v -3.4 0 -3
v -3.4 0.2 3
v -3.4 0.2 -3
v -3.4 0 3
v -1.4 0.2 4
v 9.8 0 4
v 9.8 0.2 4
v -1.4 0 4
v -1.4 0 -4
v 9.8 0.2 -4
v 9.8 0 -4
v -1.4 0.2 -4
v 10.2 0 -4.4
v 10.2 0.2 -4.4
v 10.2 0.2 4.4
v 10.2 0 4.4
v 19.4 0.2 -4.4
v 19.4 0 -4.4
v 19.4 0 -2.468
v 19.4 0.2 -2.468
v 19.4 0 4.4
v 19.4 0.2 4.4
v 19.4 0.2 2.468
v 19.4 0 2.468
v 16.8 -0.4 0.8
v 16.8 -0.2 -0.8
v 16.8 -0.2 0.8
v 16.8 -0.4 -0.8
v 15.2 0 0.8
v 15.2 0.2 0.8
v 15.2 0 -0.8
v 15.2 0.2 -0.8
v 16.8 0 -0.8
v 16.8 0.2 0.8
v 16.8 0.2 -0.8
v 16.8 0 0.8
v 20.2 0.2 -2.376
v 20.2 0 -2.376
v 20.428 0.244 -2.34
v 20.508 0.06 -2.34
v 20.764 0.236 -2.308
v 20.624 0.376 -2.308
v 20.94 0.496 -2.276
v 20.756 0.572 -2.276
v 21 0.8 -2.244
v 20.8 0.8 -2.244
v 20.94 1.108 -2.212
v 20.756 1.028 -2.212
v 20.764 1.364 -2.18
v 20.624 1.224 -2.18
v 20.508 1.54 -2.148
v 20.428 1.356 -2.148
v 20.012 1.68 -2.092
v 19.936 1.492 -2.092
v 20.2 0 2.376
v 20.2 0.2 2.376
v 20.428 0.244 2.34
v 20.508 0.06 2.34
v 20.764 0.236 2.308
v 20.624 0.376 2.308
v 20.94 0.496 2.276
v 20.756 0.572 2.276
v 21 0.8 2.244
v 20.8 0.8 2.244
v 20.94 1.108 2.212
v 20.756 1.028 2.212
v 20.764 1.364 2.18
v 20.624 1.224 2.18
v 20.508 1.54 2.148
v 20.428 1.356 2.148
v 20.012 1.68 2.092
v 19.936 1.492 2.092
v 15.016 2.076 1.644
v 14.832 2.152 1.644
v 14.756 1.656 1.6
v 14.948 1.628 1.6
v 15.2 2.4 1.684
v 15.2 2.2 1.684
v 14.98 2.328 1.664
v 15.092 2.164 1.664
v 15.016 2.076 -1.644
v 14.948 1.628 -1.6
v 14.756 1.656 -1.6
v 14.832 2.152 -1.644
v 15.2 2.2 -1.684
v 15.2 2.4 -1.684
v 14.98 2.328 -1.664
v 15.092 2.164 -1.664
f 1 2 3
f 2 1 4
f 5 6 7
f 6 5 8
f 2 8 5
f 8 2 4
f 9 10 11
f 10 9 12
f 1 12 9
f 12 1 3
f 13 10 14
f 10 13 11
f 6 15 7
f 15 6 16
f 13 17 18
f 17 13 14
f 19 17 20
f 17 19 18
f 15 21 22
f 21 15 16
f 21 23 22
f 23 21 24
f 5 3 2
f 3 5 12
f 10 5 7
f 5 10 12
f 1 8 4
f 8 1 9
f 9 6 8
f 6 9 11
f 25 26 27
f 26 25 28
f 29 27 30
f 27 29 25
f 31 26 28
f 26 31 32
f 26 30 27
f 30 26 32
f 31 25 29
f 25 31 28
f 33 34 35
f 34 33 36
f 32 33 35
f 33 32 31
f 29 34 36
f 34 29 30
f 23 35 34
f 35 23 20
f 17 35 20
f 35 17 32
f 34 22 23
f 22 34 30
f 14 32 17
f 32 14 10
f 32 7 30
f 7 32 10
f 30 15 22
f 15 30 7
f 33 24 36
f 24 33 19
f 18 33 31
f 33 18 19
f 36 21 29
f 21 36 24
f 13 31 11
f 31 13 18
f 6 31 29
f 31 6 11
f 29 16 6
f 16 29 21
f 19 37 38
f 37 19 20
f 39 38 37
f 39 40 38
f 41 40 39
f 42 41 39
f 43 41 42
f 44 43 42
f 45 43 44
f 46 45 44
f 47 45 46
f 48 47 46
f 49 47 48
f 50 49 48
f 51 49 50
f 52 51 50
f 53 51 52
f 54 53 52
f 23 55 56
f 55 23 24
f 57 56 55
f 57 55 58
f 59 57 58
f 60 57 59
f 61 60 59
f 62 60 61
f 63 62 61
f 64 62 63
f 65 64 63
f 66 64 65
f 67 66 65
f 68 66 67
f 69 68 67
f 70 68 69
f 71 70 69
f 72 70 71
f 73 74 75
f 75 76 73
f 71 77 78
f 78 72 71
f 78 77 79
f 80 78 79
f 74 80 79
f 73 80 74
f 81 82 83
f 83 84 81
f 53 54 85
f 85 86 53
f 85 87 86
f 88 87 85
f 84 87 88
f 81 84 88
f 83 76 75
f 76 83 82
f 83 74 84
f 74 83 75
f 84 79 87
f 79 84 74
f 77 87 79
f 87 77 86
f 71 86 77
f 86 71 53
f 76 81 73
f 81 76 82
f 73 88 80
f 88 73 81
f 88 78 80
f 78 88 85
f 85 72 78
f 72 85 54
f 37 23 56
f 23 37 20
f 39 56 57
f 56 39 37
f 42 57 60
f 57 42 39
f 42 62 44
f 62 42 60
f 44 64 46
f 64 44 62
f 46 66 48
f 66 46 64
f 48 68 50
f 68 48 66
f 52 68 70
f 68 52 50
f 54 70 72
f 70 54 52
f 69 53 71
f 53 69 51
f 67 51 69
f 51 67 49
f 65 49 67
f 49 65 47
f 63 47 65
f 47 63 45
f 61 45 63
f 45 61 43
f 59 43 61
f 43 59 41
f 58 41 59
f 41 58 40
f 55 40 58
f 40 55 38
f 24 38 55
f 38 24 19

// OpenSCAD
// file: ../p/rect2p.scad
use <../lib.scad>
function ldraw_lib__rect2p() = [
// 0 Rectangle with 2 Parallel Edges
// 0 Name: rect2p.dat
// 0 Author: Donald Sutter [technog]
// 0 !LDRAW_ORG Primitive UPDATE 2010-01
// 0 !LICENSE Licensed under CC BY 4.0 : see CAreadme.txt
// 
// 0 BFC CERTIFY CCW
  [0,"BFC","CERTIFY"],
  [0,"BFC","CCW"],
// 
// 0 !HISTORY 2003-08-01 [PTadmin] Official Update 2003-02
// 0 !HISTORY 2007-06-24 [PTadmin] Header formatted for Contributor Agreement
// 0 !HISTORY 2008-07-01 [PTadmin] Official Update 2008-01
// 0 !HISTORY 2010-01-17 [mikeheide] changed winding to CCW
// 0 !HISTORY 2010-04-05 [PTadmin] Official Update 2010-01
// 
// 
// 2 24 1 0 1 -1 0 1
  [2,24,1,0,1,-1,0,1],
// 2 24 -1 0 -1 1 0 -1
  [2,24,-1,0,-1,1,0,-1],
// 4 16 -1 0 1 -1 0 -1 1 0 -1 1 0 1
  [4,16,-1,0,1,-1,0,-1,1,0,-1,1,0,1],
// 0
];
module ldraw_lib__rect2p(step=0, col=false, unit=2/5, alt=false, line=0.2, solid=!$preview)
    makepoly(ldraw_lib__rect2p(), step=step, col=col, unit=unit, alt=alt, line=line, solid=solid);
ldraw_lib__rect2p(line=0.2);
// file: ../p/box5-2p.scad
use <../lib.scad>
function ldraw_lib__box5_2p() = [
// 0 Box with  5 Faces without  2 Parallel Edges
// 0 Name: box5-2p.dat
// 0 Author: Willy Tschager [Holly-Wood]
// 0 !LDRAW_ORG Primitive UPDATE 2024-01
// 0 !LICENSE Licensed under CC BY 4.0 : see CAreadme.txt
// 
// 0 BFC CERTIFY CCW
  [0,"BFC","CERTIFY"],
  [0,"BFC","CCW"],
// 
// 0 !HISTORY 2012-03-30 [PTadmin] Official Update 2012-01
// 0 !HISTORY 2024-01-04 [Holly-Wood] Complete re-write, original by Brickaneer
// 0 !HISTORY 2024-01-29 [OrionP] Official Update 2024-01
// 
// 2 24 -1 1 1 1 1 1
  [2,24,-1,1,1,1,1,1],
// 2 24 -1 1 -1 -1 1 1
  [2,24,-1,1,-1,-1,1,1],
// 2 24 1 1 -1 -1 1 -1
  [2,24,1,1,-1,-1,1,-1],
// 2 24 1 1 1 1 1 -1
  [2,24,1,1,1,1,1,-1],
// 4 16 1 1 1 1 1 -1 -1 1 -1 -1 1 1
  [4,16,1,1,1,1,1,-1,-1,1,-1,-1,1,1],
// 
// 2 24 -1 1 1 -1 0 1
  [2,24,-1,1,1,-1,0,1],
// 2 24 -1 1 -1 -1 0 -1
  [2,24,-1,1,-1,-1,0,-1],
// 2 24 -1 0 -1 -1 0 1
  [2,24,-1,0,-1,-1,0,1],
// 4 16 -1 1 1 -1 1 -1 -1 0 -1 -1 0 1
  [4,16,-1,1,1,-1,1,-1,-1,0,-1,-1,0,1],
// 
// 2 24 1 1 1 1 0 1
  [2,24,1,1,1,1,0,1],
// 2 24 1 1 -1 1 0 -1
  [2,24,1,1,-1,1,0,-1],
// 2 24 1 0 1 1 0 -1
  [2,24,1,0,1,1,0,-1],
// 4 16 1 1 -1 1 1 1 1 0 1 1 0 -1
  [4,16,1,1,-1,1,1,1,1,0,1,1,0,-1],
// 
// 4 16 1 1 1 -1 1 1 -1 0 1 1 0 1
  [4,16,1,1,1,-1,1,1,-1,0,1,1,0,1],
// 4 16 -1 1 -1 1 1 -1 1 0 -1 -1 0 -1
  [4,16,-1,1,-1,1,1,-1,1,0,-1,-1,0,-1],
];
module ldraw_lib__box5_2p(step=0, col=false, unit=2/5, alt=false, line=0.2, solid=!$preview)
    makepoly(ldraw_lib__box5_2p(), step=step, col=col, unit=unit, alt=alt, line=line, solid=solid);
ldraw_lib__box5_2p(line=0.2);
// file: ../p/box3u4a.scad
use <../lib.scad>
function ldraw_lib__box3u4a() = [
// 0 Box with 3 Faces without 4 Adjacent Edges
// 0 Name: box3u4a.dat
// 0 Author: Niels Karsdorp [nielsk]
// 0 !LDRAW_ORG Primitive UPDATE 2009-01
// 0 !LICENSE Licensed under CC BY 4.0 : see CAreadme.txt
// 
// 0 BFC CERTIFY CCW
  [0,"BFC","CERTIFY"],
  [0,"BFC","CCW"],
// 
// 0 !HISTORY 2009-05-02 [PTadmin] Official Update 2009-01
// 
// 
// 2 24 1 1 1 -1 1 1
  [2,24,1,1,1,-1,1,1],
// 2 24 -1 1 -1 1 1 -1
  [2,24,-1,1,-1,1,1,-1],
// 2 24 1 1 1 1 1 -1
  [2,24,1,1,1,1,1,-1],
// 2 24 -1 1 1 -1 1 -1
  [2,24,-1,1,1,-1,1,-1],
// 2 24 1 1 1 1 0 1
  [2,24,1,1,1,1,0,1],
// 2 24 1 1 -1 1 0 -1
  [2,24,1,1,-1,1,0,-1],
// 2 24 -1 1 1 -1 0 1
  [2,24,-1,1,1,-1,0,1],
// 2 24 -1 1 -1 -1 0 -1
  [2,24,-1,1,-1,-1,0,-1],
// 4 16 -1 1 -1 -1 1 1 1 1 1 1 1 -1
  [4,16,-1,1,-1,-1,1,1,1,1,1,1,1,-1],
// 4 16 -1 1 1 -1 0 1 1 0 1 1 1 1
  [4,16,-1,1,1,-1,0,1,1,0,1,1,1,1],
// 4 16 1 1 -1 1 0 -1 -1 0 -1 -1 1 -1
  [4,16,1,1,-1,1,0,-1,-1,0,-1,-1,1,-1],
// 0
];
module ldraw_lib__box3u4a(step=0, col=false, unit=2/5, alt=false, line=0.2, solid=!$preview)
    makepoly(ldraw_lib__box3u4a(), step=step, col=col, unit=unit, alt=alt, line=line, solid=solid);
ldraw_lib__box3u4a(line=0.2);
// file: ../p/box2-5.scad
use <../lib.scad>
function ldraw_lib__box2_5() = [
// 0 Box with 2 Faces without 5 Edges
// 0 Name: box2-5.dat
// 0 Author: Steffen [Steffen]
// 0 !LDRAW_ORG Primitive UPDATE 2003-03
// 0 !LICENSE Licensed under CC BY 4.0 : see CAreadme.txt
// 
// 0 BFC CERTIFY CCW
  [0,"BFC","CERTIFY"],
  [0,"BFC","CCW"],
// 
// 0 !HISTORY 2003-12-19 [PTadmin] Official Update 2003-03
// 0 !HISTORY 2007-06-24 [PTadmin] Header formatted for Contributor Agreement
// 0 !HISTORY 2008-07-01 [PTadmin] Official Update 2008-01
// 
// 
// 2 24 1 1 1 -1 1 1
  [2,24,1,1,1,-1,1,1],
// 2 24 1 1 -1 -1 1 -1
  [2,24,1,1,-1,-1,1,-1],
// 2 24 1 -1 1 -1 -1 1
  [2,24,1,-1,1,-1,-1,1],
// 2 24 -1 -1 1 -1 1 1
  [2,24,-1,-1,1,-1,1,1],
// 2 24 1 -1 1 1 1 1
  [2,24,1,-1,1,1,1,1],
// 2 24 -1 1 -1 -1 1 1
  [2,24,-1,1,-1,-1,1,1],
// 2 24 1 1 -1 1 1 1
  [2,24,1,1,-1,1,1,1],
// 4 16 1 1 1 1 1 -1 -1 1 -1 -1 1 1
  [4,16,1,1,1,1,1,-1,-1,1,-1,-1,1,1],
// 4 16 1 1 1 -1 1 1 -1 -1 1 1 -1 1
  [4,16,1,1,1,-1,1,1,-1,-1,1,1,-1,1],
// 0
];
module ldraw_lib__box2_5(step=0, col=false, unit=2/5, alt=false, line=0.2, solid=!$preview)
    makepoly(ldraw_lib__box2_5(), step=step, col=col, unit=unit, alt=alt, line=line, solid=solid);
ldraw_lib__box2_5(line=0.2);
// main file
use <../lib.scad>
use <../p/box2-5.scad>
use <../p/box3u4a.scad>
use <../p/box5-2p.scad>
use <../p/rect2p.scad>
use <s/u9641s01.scad>
function ldraw_lib__u9641() = [
// 0 ~Electric 9V Battery Box  4 x 14 x  4 Bottom - Contact Horizontal Long
// 0 Name: u9641.dat
// 0 Author: Gerald Lasser [GeraldLasser]
// 0 !LDRAW_ORG Part UPDATE 2024-08
// 0 !LICENSE Licensed under CC BY 4.0 : see CAreadme.txt
// 
// 0 BFC CERTIFY CCW
  [0,"BFC","CERTIFY"],
  [0,"BFC","CCW"],
// 
// 0 !HISTORY 2024-09-30 [OrionP] Official Update 2024-08
// 
// 1 16 -8.5 0 .25 0 1 0 7.5 0 0 0 0 -.25 rect2p.dat
  [1,16,-8.5,0,.25,0,1,0,7.5,0,0,0,0,-.25, ldraw_lib__rect2p()],
// 1 16 8 -8.75 .25 0 2.5 -14 0 -1.25 0 -.25 0 0 box2-5.dat
  [1,16,8,-8.75,.25,0,2.5,-14,0,-1.25,0,-.25,0,0, ldraw_lib__box2_5()],
// 1 16 8 8.75 .25 0 2.5 -14 0 1.25 0 -.25 0 0 box2-5.dat
  [1,16,8,8.75,.25,0,2.5,-14,0,1.25,0,-.25,0,0, ldraw_lib__box2_5()],
// 1 16 25 10.5 .25 -.5 0 0 -.5 -1 0 0 0 .25 rect2p.dat
  [1,16,25,10.5,.25,-.5,0,0,-.5,-1,0,0,0,.25, ldraw_lib__rect2p()],
// 1 16 25 -10.5 .25 .5 0 0 -.5 1 0 0 0 .25 rect2p.dat
  [1,16,25,-10.5,.25,.5,0,0,-.5,1,0,0,0,.25, ldraw_lib__rect2p()],
// 1 16 37 8.585 .25 0 0 11.5 0 2.415 0 -.25 0 0 box2-5.dat
  [1,16,37,8.585,.25,0,0,11.5,0,2.415,0,-.25,0,0, ldraw_lib__box2_5()],
// 1 16 37 -8.585 .25 0 0 11.5 0 -2.415 0 -.25 0 0 box2-5.dat
  [1,16,37,-8.585,.25,0,0,11.5,0,-2.415,0,-.25,0,0, ldraw_lib__box2_5()],
// 4 16 -8.5 -7.5 .5 -3.5 -10 .5 -3.5 10 .5 -8.5 7.5 .5
  [4,16,-8.5,-7.5,.5,-3.5,-10,.5,-3.5,10,.5,-8.5,7.5,.5],
// 4 16 -3.5 -10 .5 24.5 -10 .5 24.5 10 .5 -3.5 10 .5
  [4,16,-3.5,-10,.5,24.5,-10,.5,24.5,10,.5,-3.5,10,.5],
// 4 16 -3.5 10 0 -3.5 -10 0 -8.5 -7.5 0 -8.5 7.5 0
  [4,16,-3.5,10,0,-3.5,-10,0,-8.5,-7.5,0,-8.5,7.5,0],
// 4 16 24.5 10 0 24.5 -10 0 -3.5 -10 0 -3.5 10 0
  [4,16,24.5,10,0,24.5,-10,0,-3.5,-10,0,-3.5,10,0],
// 
// 1 16 38 0 .25 0 4 0 2 0 0 0 -1 .25 box5-2p.dat
  [1,16,38,0,.25,0,4,0,2,0,0,0,-1,.25, ldraw_lib__box5_2p()],
// 0 BFC INVERTNEXT
  [0,"BFC","INVERTNEXT"],
// 1 16 38 0 .25 0 4 0 0 0 2 -.25 0 0 box3u4a.dat
  [1,16,38,0,.25,0,4,0,0,0,2,-.25,0,0, ldraw_lib__box3u4a()],
// 
// 4 16 42 2 .5 42 -2 .5 48.5 -6.17 .5 48.5 6.17 .5
  [4,16,42,2,.5,42,-2,.5,48.5,-6.17,.5,48.5,6.17,.5],
// 4 16 42 2 .5 48.5 6.17 .5 48.5 11 .5 38 2 .5
  [4,16,42,2,.5,48.5,6.17,.5,48.5,11,.5,38,2,.5],
// 4 16 48.5 -6.17 .5 42 -2 .5 38 -2 .5 48.5 -11 .5
  [4,16,48.5,-6.17,.5,42,-2,.5,38,-2,.5,48.5,-11,.5],
// 4 16 38 2 .5 48.5 11 .5 25.5 11 .5 24.5 10 .5
  [4,16,38,2,.5,48.5,11,.5,25.5,11,.5,24.5,10,.5],
// 4 16 38 2 .5 24.5 10 .5 24.5 -10 .5 38 -2 .5
  [4,16,38,2,.5,24.5,10,.5,24.5,-10,.5,38,-2,.5],
// 4 16 38 -2 .5 24.5 -10 .5 25.5 -11 .5 48.5 -11 .5
  [4,16,38,-2,.5,24.5,-10,.5,25.5,-11,.5,48.5,-11,.5],
// 4 16 48.5 -6.17 0 42 -2 0 42 2 0 48.5 6.17 0
  [4,16,48.5,-6.17,0,42,-2,0,42,2,0,48.5,6.17,0],
// 4 16 48.5 11 0 48.5 6.17 0 42 2 0 38 2 0
  [4,16,48.5,11,0,48.5,6.17,0,42,2,0,38,2,0],
// 4 16 38 -2 0 42 -2 0 48.5 -6.17 0 48.5 -11 0
  [4,16,38,-2,0,42,-2,0,48.5,-6.17,0,48.5,-11,0],
// 4 16 25.5 11 0 48.5 11 0 38 2 0 24.5 10 0
  [4,16,25.5,11,0,48.5,11,0,38,2,0,24.5,10,0],
// 4 16 24.5 -10 0 24.5 10 0 38 2 0 38 -2 0
  [4,16,24.5,-10,0,24.5,10,0,38,2,0,38,-2,0],
// 4 16 25.5 -11 0 24.5 -10 0 38 -2 0 48.5 -11 0
  [4,16,25.5,-11,0,24.5,-10,0,38,-2,0,48.5,-11,0],
// 5 24 38 -2 .5 38 2 .5 24.5 10 .5 42 -2 -.5
  [5,24,38,-2,.5,38,2,.5,24.5,10,.5,42,-2,-.5],
// 5 24 38 -2 0 38 2 0 42 2 -1 24.5 10 0
  [5,24,38,-2,0,38,2,0,42,2,-1,24.5,10,0],
// 
// 1 16 38 -.25 .5 1 0 0 0 1 0 0 0 -1 s\u9641s01.dat
  [1,16,38,-.25,.5,1,0,0,0,1,0,0,0,-1, ldraw_lib__s__u9641s01()],
];
module ldraw_lib__u9641(step=0, col=false, unit=2/5, alt=false, line=0.2, solid=!$preview)
    makepoly(ldraw_lib__u9641(), step=step, col=col, unit=unit, alt=alt, line=line, solid=solid);
ldraw_lib__u9641(line=0.2);
